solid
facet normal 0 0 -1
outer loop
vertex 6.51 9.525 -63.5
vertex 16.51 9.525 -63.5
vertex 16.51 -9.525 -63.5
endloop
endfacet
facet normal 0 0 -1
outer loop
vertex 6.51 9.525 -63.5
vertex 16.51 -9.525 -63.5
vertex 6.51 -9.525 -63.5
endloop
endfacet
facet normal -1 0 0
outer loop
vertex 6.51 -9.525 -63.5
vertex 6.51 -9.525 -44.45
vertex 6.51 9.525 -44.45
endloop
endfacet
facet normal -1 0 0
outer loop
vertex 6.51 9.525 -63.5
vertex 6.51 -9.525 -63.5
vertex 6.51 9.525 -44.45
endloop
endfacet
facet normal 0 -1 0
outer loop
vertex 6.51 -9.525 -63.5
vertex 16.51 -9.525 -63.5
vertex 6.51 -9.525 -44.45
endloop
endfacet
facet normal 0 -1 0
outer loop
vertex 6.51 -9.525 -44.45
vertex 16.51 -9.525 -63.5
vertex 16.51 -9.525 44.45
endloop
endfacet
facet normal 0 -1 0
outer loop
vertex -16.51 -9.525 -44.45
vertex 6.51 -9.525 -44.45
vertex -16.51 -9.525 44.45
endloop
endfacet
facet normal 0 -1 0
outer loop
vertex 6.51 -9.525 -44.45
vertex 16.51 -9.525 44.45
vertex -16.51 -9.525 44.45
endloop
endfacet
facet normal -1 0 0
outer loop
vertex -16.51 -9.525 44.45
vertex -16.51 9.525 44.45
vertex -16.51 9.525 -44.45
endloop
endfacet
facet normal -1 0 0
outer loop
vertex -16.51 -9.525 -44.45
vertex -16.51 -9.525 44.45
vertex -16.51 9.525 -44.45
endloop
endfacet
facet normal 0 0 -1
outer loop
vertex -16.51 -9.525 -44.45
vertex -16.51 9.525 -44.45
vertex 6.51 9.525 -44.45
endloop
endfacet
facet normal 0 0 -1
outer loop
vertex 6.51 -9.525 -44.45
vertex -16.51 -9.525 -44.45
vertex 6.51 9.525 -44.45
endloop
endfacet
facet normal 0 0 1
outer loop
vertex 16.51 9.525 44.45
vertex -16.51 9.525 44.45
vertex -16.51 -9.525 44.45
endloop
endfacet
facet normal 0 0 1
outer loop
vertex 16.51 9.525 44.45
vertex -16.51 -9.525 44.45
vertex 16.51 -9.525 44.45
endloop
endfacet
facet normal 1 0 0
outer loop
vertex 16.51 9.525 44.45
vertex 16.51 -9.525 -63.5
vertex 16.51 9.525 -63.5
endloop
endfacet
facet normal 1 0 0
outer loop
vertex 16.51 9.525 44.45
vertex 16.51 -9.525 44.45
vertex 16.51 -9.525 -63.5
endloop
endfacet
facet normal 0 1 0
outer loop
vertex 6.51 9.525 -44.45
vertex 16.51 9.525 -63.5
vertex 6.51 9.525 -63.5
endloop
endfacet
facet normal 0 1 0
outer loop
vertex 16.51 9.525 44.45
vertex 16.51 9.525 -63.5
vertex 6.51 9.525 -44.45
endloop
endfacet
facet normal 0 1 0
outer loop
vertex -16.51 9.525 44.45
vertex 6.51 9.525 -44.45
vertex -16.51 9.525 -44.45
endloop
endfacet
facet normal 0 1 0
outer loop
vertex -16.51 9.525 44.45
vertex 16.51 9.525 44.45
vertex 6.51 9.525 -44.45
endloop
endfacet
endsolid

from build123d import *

# Parameters (mm, degrees)
SKETCH1_W           = 33.02
SKETCH1_H           = 88.9
BOSS_EXTRUDE1_DEPTH = 9.525
SKETCH2_W           = 10
SKETCH2_H           = 19.05
BOSS_EXTRUDE2_DEPTH = 19.05


with BuildPart() as part:
    # Sketch1 → Boss-Extrude1 (new body, symmetric)
    with BuildSketch(Plane(origin=(0, 0, 0), x_dir=(1, 0, 0), z_dir=(0, 1, 0))):
        Rectangle(SKETCH1_W, SKETCH1_H)
    extrude(amount=BOSS_EXTRUDE1_DEPTH, both=True)

    # Sketch2 → Boss-Extrude2 (add)
    with BuildSketch(Plane(origin=(0, 0, -44.45), x_dir=(-1, 0, 0), z_dir=(0, 0, -1))):
        with Locations((-11.51, 0)):
            Rectangle(SKETCH2_W, SKETCH2_H)
    extrude(amount=BOSS_EXTRUDE2_DEPTH)


solid = part.part
